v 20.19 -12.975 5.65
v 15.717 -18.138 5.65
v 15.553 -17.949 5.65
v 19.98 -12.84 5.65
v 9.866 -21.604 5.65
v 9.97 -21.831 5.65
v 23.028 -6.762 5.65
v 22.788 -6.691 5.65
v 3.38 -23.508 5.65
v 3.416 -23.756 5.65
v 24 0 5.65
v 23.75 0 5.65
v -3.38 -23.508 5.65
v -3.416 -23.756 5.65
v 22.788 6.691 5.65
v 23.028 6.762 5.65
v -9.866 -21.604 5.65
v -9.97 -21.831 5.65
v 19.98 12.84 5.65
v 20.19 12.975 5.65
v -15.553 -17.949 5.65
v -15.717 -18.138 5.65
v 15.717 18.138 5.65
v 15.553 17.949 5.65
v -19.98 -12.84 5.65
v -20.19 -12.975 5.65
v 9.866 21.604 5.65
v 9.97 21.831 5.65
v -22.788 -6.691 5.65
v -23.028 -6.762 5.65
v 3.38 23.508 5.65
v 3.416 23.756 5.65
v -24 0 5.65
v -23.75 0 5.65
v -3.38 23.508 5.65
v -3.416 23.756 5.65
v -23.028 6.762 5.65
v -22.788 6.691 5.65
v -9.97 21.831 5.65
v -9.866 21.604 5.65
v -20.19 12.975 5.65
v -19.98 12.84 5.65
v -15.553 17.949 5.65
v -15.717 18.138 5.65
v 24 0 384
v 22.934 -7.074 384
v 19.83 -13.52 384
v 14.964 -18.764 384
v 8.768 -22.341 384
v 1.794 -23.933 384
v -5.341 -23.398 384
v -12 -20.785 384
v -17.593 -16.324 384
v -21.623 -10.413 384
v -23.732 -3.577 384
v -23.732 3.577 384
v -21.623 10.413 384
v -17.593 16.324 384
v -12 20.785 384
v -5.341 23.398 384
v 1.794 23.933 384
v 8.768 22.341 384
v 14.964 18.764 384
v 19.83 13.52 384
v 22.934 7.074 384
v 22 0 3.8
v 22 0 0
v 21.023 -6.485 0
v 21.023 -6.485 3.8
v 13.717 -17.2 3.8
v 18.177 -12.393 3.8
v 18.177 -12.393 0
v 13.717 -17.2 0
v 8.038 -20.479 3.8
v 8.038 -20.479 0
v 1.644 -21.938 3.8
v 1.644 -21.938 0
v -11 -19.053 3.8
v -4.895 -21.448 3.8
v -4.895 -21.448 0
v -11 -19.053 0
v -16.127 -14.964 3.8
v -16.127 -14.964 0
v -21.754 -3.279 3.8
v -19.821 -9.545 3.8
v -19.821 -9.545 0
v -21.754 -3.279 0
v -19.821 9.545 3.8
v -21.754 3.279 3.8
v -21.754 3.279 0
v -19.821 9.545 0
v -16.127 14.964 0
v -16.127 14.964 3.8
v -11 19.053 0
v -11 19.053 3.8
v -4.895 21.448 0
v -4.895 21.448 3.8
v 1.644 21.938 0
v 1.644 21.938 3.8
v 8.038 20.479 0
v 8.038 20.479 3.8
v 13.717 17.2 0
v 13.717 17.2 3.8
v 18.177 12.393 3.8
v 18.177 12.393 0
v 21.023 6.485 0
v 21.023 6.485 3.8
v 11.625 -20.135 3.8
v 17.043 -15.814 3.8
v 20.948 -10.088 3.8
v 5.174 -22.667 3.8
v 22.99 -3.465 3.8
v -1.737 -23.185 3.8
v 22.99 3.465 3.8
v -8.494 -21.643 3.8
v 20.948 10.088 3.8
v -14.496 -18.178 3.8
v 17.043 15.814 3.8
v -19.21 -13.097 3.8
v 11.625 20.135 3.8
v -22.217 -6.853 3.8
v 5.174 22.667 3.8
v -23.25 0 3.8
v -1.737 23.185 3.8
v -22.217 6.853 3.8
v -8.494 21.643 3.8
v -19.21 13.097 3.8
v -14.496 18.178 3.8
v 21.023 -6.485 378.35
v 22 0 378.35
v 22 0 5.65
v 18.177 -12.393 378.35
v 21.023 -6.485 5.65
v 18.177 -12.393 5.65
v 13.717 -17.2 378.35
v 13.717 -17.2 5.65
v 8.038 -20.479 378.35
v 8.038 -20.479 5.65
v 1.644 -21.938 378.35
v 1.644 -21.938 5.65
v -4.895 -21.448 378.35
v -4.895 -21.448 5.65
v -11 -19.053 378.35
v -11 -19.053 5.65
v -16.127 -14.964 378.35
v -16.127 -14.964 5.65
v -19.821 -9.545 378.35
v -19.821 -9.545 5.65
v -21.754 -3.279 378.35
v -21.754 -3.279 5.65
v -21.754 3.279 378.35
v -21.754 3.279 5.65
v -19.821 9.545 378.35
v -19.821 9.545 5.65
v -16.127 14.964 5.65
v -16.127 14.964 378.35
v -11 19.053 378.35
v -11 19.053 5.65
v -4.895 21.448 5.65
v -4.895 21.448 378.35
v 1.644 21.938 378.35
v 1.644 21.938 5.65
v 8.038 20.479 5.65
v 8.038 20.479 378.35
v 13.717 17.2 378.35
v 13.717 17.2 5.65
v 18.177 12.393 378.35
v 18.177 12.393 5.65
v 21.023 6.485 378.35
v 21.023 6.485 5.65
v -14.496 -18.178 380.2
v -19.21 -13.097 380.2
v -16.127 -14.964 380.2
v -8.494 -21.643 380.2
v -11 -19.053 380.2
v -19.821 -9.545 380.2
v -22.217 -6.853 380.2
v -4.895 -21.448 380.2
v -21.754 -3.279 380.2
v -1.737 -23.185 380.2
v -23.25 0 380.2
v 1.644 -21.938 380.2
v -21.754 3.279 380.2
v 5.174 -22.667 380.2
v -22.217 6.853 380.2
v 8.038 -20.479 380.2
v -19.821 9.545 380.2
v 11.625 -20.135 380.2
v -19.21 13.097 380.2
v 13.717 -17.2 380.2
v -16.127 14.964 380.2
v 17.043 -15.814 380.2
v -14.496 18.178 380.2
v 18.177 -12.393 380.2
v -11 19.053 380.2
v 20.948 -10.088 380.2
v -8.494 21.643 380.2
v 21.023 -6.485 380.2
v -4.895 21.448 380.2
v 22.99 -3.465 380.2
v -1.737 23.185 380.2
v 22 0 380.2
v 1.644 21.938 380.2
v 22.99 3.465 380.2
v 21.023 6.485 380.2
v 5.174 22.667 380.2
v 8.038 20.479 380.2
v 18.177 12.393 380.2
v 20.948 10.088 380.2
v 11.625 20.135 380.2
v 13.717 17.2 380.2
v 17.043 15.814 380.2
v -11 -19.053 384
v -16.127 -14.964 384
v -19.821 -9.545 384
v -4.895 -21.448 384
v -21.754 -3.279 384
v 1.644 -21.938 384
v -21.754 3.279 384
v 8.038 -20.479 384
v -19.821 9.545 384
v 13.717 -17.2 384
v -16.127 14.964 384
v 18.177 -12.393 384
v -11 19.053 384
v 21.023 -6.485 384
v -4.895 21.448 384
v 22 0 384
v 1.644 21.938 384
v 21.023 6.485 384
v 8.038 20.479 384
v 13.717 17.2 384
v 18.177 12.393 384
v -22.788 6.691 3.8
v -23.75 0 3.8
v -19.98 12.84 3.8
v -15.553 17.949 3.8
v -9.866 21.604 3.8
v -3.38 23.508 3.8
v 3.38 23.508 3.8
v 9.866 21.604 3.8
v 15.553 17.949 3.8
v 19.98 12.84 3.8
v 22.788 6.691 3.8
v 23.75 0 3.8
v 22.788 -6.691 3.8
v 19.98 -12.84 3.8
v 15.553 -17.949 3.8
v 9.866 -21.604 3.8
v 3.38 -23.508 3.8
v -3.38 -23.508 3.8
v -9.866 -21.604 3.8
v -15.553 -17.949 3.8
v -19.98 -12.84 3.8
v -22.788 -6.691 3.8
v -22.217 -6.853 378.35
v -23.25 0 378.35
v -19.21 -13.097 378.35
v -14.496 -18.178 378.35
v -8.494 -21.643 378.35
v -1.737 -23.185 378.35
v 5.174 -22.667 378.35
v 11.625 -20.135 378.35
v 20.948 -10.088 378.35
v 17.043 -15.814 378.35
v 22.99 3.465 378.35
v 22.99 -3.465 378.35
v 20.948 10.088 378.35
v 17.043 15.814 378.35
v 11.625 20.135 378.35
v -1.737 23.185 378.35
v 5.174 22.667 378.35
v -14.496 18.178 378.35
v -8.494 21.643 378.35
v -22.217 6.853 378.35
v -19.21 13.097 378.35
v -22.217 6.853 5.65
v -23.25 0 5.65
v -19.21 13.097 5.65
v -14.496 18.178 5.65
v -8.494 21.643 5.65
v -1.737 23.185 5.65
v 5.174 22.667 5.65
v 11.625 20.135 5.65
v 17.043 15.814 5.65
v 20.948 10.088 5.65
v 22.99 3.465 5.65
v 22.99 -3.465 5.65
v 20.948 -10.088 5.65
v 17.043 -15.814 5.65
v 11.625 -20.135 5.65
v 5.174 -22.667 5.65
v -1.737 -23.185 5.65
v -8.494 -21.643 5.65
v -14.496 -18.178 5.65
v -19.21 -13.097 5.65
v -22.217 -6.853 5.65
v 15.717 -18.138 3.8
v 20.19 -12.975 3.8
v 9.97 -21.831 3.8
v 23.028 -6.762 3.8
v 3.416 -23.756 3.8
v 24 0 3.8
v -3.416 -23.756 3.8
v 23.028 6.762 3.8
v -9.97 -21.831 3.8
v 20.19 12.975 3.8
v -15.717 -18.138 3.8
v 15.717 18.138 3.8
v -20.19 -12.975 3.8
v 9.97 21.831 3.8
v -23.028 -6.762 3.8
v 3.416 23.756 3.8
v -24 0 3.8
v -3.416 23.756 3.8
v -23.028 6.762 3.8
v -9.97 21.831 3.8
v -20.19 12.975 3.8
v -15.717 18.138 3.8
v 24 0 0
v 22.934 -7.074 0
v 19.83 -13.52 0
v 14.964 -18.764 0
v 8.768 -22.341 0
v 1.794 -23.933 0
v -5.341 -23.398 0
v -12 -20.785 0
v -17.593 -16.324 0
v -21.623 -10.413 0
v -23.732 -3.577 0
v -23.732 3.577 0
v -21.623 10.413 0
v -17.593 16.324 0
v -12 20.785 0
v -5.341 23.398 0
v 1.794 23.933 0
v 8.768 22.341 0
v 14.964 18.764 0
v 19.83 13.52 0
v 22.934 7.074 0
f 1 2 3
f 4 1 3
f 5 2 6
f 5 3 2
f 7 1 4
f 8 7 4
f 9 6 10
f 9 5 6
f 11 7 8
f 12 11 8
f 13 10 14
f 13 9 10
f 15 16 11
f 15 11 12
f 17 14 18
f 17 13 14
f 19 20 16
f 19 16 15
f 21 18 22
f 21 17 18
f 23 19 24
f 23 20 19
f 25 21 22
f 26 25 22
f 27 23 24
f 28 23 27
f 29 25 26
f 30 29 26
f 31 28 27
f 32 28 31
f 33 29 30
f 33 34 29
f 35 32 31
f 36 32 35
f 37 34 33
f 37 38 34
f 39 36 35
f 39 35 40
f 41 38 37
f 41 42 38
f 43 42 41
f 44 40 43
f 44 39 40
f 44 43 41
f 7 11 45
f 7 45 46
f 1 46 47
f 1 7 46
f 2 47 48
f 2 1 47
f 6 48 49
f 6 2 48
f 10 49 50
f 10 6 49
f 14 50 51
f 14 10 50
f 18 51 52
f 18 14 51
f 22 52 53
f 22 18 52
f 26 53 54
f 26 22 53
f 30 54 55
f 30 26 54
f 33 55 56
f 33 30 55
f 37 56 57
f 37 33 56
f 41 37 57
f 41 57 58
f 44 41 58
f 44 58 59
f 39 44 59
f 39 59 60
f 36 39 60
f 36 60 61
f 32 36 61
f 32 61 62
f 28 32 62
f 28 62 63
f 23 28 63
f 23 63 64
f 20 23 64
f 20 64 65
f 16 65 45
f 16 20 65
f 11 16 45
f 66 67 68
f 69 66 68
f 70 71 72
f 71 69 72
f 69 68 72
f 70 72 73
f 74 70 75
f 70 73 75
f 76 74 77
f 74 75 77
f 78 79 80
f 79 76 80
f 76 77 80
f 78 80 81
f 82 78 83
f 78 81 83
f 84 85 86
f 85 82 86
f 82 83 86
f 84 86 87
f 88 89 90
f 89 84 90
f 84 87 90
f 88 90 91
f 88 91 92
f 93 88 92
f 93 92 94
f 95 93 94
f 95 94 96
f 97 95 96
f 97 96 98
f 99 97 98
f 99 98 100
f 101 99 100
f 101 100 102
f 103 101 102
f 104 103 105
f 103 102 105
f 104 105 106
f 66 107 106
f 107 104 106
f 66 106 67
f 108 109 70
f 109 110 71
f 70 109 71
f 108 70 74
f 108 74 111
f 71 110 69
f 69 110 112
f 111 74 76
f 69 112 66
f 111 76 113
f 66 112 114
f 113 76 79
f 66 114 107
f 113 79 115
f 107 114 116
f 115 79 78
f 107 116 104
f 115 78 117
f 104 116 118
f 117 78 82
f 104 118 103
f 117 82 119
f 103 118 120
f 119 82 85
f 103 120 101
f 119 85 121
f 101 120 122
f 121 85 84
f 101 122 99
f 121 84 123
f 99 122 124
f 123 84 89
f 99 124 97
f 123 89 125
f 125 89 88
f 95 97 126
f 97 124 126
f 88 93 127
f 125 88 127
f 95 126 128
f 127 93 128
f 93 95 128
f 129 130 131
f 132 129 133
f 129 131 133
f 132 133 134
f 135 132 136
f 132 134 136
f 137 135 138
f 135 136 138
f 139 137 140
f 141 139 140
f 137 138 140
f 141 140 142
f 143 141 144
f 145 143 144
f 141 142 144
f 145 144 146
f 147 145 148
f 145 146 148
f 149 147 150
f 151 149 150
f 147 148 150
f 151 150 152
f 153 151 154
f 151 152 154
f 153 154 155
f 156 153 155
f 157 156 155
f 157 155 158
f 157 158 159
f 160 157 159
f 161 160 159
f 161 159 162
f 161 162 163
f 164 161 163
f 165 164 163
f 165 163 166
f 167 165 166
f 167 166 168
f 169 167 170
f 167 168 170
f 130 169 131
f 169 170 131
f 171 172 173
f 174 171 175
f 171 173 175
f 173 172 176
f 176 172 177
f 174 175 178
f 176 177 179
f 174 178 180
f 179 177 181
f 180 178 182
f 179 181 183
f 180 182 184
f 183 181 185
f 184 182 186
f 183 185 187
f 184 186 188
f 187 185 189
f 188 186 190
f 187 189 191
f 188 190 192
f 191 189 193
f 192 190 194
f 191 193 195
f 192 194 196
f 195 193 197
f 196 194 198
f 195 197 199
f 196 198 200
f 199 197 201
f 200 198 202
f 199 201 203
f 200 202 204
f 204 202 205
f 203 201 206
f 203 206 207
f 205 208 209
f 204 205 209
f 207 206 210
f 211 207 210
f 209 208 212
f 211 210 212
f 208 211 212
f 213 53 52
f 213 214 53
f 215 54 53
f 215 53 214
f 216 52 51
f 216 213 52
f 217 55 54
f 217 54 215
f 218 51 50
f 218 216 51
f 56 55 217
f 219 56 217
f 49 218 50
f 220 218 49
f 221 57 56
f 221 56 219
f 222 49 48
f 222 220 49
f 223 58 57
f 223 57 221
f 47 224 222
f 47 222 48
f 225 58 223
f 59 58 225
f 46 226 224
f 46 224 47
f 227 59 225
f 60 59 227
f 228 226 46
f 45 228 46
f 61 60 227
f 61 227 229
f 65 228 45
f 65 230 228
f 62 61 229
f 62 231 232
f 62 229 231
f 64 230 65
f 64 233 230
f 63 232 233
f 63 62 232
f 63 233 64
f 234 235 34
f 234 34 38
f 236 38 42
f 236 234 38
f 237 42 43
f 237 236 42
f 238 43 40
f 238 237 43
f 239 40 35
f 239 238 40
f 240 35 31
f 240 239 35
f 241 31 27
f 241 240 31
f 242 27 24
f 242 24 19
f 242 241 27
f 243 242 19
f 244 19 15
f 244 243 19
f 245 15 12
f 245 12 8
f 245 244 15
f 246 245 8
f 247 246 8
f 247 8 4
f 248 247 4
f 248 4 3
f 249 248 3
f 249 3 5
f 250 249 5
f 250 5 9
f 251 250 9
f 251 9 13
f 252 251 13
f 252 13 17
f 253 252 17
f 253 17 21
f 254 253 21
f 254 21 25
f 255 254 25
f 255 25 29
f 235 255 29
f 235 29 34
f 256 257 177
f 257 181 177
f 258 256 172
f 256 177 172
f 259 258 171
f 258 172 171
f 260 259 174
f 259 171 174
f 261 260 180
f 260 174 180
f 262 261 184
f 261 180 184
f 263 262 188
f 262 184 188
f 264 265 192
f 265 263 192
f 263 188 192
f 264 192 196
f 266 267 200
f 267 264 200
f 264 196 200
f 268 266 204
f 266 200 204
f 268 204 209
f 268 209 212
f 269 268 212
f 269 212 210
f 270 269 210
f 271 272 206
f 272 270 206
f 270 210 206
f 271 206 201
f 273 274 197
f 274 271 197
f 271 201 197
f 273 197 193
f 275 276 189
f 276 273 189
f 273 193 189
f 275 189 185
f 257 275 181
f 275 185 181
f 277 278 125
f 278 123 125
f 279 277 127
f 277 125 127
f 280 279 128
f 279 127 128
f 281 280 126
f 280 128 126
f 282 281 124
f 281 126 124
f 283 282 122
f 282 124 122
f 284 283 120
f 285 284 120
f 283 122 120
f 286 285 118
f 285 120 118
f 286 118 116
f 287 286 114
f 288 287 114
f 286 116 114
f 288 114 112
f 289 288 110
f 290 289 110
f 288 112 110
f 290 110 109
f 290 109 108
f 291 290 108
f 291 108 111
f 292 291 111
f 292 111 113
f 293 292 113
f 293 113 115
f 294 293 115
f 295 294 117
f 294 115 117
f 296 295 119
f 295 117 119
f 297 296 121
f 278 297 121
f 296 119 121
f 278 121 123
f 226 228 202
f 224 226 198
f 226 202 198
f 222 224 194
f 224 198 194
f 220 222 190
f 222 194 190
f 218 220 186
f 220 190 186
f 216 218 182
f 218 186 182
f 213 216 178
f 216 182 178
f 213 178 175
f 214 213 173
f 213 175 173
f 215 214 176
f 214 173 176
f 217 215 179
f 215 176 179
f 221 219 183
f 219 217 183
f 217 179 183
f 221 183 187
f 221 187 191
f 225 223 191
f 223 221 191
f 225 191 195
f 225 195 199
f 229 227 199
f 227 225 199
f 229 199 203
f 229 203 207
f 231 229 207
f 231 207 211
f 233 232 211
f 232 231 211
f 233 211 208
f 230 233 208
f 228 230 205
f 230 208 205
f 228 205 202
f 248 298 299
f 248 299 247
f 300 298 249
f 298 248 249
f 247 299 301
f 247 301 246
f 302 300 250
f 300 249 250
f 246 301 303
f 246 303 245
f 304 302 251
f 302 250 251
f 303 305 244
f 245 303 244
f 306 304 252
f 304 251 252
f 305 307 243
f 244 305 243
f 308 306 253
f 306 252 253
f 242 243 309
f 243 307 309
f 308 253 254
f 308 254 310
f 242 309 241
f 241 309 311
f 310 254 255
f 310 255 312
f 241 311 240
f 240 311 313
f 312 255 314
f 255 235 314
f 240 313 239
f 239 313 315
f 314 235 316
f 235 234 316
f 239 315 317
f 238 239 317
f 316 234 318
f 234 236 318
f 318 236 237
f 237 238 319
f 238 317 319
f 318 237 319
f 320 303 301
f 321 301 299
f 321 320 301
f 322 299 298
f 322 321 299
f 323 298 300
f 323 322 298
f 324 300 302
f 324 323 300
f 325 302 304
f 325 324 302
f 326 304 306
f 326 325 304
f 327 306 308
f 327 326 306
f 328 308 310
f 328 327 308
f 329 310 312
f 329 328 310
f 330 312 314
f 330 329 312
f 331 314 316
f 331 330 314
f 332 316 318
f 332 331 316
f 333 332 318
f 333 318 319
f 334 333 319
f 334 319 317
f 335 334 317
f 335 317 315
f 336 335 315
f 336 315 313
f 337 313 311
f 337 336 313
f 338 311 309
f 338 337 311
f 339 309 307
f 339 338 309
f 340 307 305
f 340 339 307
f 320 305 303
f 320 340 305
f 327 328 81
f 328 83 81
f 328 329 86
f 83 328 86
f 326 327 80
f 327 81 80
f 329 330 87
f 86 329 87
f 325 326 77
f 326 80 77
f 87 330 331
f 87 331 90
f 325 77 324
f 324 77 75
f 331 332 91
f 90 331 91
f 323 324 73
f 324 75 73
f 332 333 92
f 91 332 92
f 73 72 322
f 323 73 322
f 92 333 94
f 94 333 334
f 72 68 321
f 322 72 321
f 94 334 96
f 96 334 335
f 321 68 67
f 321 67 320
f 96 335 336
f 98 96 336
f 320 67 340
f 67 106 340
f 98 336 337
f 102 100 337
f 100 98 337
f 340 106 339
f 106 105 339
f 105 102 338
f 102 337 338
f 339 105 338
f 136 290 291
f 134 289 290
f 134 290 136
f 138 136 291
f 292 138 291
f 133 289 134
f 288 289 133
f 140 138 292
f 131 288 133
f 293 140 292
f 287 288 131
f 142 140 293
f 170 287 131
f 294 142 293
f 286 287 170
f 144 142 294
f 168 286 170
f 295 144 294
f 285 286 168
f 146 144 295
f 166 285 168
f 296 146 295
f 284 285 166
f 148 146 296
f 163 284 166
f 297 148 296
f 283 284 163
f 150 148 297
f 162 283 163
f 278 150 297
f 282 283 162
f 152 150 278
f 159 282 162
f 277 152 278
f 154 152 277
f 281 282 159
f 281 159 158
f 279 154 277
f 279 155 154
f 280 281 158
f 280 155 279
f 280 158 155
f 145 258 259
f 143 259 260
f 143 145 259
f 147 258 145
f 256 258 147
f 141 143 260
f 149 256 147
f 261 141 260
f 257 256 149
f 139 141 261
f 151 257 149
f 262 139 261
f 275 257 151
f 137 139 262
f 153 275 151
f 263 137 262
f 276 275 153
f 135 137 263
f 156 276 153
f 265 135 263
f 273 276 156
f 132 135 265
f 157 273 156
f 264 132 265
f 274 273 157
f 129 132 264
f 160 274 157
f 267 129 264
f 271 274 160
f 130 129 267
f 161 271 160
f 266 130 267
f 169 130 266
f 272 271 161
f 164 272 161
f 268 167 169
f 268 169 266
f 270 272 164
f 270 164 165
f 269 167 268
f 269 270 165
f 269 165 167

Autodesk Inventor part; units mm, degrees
ref_plane "YZ Plane" through (0, 0, 0) normal (1, 0, 0) x (0, 1, 0)
sketch "Sketch1" plane through (0, 0, 0) normal (0, 0, 1) x (1, 0, 0)
  circle A0 centre (0, 0) radius 24
  circle A1 centre (0, 0) radius 22
  dimension "d0" = 48
  dimension "d1" = 44
extrude "Extrusion1" add sketch "Sketch1" along normal blind 384
ref_plane "Work Plane1" through (0, 0, 192) normal (0, 0, 1) x (1, 0, 0)
ref_plane "Work Plane2" through (0, 0, 3.8) normal (0, 0, -1) x (-1, 0, 0)
sketch "Sketch2" plane through (0, 0, 0) normal (0, 0, -1) x (-1, 0, 0)
  circle A0 centre (0, 0) radius 23.25
  circle A1 centre (0, 0) radius 22 projected
  dimension "d4" = 46.5
extrude "Extrusion2" cut sketch "Sketch2" against normal blind 1.85 from surface at -3.8
mirror "Mirror1" about plane through (0, 0, 192) normal (0, 0, 1) of "Extrusion2"
sketch "Sketch3" plane through (0, 0, 0) normal (0, 0, -1) x (-1, 0, 0)
  circle A0 centre (0, 0) radius 23.75
  circle A1 centre (0, 0) radius 24 projected
  dimension "d8" = 47.5
extrude "Extrusion3" cut sketch "Sketch3" against normal up to surface (1.85 mm away) from surface at -3.8
properties part number "SRM 2020 Casing EE5" material "Aluminum 6061"
